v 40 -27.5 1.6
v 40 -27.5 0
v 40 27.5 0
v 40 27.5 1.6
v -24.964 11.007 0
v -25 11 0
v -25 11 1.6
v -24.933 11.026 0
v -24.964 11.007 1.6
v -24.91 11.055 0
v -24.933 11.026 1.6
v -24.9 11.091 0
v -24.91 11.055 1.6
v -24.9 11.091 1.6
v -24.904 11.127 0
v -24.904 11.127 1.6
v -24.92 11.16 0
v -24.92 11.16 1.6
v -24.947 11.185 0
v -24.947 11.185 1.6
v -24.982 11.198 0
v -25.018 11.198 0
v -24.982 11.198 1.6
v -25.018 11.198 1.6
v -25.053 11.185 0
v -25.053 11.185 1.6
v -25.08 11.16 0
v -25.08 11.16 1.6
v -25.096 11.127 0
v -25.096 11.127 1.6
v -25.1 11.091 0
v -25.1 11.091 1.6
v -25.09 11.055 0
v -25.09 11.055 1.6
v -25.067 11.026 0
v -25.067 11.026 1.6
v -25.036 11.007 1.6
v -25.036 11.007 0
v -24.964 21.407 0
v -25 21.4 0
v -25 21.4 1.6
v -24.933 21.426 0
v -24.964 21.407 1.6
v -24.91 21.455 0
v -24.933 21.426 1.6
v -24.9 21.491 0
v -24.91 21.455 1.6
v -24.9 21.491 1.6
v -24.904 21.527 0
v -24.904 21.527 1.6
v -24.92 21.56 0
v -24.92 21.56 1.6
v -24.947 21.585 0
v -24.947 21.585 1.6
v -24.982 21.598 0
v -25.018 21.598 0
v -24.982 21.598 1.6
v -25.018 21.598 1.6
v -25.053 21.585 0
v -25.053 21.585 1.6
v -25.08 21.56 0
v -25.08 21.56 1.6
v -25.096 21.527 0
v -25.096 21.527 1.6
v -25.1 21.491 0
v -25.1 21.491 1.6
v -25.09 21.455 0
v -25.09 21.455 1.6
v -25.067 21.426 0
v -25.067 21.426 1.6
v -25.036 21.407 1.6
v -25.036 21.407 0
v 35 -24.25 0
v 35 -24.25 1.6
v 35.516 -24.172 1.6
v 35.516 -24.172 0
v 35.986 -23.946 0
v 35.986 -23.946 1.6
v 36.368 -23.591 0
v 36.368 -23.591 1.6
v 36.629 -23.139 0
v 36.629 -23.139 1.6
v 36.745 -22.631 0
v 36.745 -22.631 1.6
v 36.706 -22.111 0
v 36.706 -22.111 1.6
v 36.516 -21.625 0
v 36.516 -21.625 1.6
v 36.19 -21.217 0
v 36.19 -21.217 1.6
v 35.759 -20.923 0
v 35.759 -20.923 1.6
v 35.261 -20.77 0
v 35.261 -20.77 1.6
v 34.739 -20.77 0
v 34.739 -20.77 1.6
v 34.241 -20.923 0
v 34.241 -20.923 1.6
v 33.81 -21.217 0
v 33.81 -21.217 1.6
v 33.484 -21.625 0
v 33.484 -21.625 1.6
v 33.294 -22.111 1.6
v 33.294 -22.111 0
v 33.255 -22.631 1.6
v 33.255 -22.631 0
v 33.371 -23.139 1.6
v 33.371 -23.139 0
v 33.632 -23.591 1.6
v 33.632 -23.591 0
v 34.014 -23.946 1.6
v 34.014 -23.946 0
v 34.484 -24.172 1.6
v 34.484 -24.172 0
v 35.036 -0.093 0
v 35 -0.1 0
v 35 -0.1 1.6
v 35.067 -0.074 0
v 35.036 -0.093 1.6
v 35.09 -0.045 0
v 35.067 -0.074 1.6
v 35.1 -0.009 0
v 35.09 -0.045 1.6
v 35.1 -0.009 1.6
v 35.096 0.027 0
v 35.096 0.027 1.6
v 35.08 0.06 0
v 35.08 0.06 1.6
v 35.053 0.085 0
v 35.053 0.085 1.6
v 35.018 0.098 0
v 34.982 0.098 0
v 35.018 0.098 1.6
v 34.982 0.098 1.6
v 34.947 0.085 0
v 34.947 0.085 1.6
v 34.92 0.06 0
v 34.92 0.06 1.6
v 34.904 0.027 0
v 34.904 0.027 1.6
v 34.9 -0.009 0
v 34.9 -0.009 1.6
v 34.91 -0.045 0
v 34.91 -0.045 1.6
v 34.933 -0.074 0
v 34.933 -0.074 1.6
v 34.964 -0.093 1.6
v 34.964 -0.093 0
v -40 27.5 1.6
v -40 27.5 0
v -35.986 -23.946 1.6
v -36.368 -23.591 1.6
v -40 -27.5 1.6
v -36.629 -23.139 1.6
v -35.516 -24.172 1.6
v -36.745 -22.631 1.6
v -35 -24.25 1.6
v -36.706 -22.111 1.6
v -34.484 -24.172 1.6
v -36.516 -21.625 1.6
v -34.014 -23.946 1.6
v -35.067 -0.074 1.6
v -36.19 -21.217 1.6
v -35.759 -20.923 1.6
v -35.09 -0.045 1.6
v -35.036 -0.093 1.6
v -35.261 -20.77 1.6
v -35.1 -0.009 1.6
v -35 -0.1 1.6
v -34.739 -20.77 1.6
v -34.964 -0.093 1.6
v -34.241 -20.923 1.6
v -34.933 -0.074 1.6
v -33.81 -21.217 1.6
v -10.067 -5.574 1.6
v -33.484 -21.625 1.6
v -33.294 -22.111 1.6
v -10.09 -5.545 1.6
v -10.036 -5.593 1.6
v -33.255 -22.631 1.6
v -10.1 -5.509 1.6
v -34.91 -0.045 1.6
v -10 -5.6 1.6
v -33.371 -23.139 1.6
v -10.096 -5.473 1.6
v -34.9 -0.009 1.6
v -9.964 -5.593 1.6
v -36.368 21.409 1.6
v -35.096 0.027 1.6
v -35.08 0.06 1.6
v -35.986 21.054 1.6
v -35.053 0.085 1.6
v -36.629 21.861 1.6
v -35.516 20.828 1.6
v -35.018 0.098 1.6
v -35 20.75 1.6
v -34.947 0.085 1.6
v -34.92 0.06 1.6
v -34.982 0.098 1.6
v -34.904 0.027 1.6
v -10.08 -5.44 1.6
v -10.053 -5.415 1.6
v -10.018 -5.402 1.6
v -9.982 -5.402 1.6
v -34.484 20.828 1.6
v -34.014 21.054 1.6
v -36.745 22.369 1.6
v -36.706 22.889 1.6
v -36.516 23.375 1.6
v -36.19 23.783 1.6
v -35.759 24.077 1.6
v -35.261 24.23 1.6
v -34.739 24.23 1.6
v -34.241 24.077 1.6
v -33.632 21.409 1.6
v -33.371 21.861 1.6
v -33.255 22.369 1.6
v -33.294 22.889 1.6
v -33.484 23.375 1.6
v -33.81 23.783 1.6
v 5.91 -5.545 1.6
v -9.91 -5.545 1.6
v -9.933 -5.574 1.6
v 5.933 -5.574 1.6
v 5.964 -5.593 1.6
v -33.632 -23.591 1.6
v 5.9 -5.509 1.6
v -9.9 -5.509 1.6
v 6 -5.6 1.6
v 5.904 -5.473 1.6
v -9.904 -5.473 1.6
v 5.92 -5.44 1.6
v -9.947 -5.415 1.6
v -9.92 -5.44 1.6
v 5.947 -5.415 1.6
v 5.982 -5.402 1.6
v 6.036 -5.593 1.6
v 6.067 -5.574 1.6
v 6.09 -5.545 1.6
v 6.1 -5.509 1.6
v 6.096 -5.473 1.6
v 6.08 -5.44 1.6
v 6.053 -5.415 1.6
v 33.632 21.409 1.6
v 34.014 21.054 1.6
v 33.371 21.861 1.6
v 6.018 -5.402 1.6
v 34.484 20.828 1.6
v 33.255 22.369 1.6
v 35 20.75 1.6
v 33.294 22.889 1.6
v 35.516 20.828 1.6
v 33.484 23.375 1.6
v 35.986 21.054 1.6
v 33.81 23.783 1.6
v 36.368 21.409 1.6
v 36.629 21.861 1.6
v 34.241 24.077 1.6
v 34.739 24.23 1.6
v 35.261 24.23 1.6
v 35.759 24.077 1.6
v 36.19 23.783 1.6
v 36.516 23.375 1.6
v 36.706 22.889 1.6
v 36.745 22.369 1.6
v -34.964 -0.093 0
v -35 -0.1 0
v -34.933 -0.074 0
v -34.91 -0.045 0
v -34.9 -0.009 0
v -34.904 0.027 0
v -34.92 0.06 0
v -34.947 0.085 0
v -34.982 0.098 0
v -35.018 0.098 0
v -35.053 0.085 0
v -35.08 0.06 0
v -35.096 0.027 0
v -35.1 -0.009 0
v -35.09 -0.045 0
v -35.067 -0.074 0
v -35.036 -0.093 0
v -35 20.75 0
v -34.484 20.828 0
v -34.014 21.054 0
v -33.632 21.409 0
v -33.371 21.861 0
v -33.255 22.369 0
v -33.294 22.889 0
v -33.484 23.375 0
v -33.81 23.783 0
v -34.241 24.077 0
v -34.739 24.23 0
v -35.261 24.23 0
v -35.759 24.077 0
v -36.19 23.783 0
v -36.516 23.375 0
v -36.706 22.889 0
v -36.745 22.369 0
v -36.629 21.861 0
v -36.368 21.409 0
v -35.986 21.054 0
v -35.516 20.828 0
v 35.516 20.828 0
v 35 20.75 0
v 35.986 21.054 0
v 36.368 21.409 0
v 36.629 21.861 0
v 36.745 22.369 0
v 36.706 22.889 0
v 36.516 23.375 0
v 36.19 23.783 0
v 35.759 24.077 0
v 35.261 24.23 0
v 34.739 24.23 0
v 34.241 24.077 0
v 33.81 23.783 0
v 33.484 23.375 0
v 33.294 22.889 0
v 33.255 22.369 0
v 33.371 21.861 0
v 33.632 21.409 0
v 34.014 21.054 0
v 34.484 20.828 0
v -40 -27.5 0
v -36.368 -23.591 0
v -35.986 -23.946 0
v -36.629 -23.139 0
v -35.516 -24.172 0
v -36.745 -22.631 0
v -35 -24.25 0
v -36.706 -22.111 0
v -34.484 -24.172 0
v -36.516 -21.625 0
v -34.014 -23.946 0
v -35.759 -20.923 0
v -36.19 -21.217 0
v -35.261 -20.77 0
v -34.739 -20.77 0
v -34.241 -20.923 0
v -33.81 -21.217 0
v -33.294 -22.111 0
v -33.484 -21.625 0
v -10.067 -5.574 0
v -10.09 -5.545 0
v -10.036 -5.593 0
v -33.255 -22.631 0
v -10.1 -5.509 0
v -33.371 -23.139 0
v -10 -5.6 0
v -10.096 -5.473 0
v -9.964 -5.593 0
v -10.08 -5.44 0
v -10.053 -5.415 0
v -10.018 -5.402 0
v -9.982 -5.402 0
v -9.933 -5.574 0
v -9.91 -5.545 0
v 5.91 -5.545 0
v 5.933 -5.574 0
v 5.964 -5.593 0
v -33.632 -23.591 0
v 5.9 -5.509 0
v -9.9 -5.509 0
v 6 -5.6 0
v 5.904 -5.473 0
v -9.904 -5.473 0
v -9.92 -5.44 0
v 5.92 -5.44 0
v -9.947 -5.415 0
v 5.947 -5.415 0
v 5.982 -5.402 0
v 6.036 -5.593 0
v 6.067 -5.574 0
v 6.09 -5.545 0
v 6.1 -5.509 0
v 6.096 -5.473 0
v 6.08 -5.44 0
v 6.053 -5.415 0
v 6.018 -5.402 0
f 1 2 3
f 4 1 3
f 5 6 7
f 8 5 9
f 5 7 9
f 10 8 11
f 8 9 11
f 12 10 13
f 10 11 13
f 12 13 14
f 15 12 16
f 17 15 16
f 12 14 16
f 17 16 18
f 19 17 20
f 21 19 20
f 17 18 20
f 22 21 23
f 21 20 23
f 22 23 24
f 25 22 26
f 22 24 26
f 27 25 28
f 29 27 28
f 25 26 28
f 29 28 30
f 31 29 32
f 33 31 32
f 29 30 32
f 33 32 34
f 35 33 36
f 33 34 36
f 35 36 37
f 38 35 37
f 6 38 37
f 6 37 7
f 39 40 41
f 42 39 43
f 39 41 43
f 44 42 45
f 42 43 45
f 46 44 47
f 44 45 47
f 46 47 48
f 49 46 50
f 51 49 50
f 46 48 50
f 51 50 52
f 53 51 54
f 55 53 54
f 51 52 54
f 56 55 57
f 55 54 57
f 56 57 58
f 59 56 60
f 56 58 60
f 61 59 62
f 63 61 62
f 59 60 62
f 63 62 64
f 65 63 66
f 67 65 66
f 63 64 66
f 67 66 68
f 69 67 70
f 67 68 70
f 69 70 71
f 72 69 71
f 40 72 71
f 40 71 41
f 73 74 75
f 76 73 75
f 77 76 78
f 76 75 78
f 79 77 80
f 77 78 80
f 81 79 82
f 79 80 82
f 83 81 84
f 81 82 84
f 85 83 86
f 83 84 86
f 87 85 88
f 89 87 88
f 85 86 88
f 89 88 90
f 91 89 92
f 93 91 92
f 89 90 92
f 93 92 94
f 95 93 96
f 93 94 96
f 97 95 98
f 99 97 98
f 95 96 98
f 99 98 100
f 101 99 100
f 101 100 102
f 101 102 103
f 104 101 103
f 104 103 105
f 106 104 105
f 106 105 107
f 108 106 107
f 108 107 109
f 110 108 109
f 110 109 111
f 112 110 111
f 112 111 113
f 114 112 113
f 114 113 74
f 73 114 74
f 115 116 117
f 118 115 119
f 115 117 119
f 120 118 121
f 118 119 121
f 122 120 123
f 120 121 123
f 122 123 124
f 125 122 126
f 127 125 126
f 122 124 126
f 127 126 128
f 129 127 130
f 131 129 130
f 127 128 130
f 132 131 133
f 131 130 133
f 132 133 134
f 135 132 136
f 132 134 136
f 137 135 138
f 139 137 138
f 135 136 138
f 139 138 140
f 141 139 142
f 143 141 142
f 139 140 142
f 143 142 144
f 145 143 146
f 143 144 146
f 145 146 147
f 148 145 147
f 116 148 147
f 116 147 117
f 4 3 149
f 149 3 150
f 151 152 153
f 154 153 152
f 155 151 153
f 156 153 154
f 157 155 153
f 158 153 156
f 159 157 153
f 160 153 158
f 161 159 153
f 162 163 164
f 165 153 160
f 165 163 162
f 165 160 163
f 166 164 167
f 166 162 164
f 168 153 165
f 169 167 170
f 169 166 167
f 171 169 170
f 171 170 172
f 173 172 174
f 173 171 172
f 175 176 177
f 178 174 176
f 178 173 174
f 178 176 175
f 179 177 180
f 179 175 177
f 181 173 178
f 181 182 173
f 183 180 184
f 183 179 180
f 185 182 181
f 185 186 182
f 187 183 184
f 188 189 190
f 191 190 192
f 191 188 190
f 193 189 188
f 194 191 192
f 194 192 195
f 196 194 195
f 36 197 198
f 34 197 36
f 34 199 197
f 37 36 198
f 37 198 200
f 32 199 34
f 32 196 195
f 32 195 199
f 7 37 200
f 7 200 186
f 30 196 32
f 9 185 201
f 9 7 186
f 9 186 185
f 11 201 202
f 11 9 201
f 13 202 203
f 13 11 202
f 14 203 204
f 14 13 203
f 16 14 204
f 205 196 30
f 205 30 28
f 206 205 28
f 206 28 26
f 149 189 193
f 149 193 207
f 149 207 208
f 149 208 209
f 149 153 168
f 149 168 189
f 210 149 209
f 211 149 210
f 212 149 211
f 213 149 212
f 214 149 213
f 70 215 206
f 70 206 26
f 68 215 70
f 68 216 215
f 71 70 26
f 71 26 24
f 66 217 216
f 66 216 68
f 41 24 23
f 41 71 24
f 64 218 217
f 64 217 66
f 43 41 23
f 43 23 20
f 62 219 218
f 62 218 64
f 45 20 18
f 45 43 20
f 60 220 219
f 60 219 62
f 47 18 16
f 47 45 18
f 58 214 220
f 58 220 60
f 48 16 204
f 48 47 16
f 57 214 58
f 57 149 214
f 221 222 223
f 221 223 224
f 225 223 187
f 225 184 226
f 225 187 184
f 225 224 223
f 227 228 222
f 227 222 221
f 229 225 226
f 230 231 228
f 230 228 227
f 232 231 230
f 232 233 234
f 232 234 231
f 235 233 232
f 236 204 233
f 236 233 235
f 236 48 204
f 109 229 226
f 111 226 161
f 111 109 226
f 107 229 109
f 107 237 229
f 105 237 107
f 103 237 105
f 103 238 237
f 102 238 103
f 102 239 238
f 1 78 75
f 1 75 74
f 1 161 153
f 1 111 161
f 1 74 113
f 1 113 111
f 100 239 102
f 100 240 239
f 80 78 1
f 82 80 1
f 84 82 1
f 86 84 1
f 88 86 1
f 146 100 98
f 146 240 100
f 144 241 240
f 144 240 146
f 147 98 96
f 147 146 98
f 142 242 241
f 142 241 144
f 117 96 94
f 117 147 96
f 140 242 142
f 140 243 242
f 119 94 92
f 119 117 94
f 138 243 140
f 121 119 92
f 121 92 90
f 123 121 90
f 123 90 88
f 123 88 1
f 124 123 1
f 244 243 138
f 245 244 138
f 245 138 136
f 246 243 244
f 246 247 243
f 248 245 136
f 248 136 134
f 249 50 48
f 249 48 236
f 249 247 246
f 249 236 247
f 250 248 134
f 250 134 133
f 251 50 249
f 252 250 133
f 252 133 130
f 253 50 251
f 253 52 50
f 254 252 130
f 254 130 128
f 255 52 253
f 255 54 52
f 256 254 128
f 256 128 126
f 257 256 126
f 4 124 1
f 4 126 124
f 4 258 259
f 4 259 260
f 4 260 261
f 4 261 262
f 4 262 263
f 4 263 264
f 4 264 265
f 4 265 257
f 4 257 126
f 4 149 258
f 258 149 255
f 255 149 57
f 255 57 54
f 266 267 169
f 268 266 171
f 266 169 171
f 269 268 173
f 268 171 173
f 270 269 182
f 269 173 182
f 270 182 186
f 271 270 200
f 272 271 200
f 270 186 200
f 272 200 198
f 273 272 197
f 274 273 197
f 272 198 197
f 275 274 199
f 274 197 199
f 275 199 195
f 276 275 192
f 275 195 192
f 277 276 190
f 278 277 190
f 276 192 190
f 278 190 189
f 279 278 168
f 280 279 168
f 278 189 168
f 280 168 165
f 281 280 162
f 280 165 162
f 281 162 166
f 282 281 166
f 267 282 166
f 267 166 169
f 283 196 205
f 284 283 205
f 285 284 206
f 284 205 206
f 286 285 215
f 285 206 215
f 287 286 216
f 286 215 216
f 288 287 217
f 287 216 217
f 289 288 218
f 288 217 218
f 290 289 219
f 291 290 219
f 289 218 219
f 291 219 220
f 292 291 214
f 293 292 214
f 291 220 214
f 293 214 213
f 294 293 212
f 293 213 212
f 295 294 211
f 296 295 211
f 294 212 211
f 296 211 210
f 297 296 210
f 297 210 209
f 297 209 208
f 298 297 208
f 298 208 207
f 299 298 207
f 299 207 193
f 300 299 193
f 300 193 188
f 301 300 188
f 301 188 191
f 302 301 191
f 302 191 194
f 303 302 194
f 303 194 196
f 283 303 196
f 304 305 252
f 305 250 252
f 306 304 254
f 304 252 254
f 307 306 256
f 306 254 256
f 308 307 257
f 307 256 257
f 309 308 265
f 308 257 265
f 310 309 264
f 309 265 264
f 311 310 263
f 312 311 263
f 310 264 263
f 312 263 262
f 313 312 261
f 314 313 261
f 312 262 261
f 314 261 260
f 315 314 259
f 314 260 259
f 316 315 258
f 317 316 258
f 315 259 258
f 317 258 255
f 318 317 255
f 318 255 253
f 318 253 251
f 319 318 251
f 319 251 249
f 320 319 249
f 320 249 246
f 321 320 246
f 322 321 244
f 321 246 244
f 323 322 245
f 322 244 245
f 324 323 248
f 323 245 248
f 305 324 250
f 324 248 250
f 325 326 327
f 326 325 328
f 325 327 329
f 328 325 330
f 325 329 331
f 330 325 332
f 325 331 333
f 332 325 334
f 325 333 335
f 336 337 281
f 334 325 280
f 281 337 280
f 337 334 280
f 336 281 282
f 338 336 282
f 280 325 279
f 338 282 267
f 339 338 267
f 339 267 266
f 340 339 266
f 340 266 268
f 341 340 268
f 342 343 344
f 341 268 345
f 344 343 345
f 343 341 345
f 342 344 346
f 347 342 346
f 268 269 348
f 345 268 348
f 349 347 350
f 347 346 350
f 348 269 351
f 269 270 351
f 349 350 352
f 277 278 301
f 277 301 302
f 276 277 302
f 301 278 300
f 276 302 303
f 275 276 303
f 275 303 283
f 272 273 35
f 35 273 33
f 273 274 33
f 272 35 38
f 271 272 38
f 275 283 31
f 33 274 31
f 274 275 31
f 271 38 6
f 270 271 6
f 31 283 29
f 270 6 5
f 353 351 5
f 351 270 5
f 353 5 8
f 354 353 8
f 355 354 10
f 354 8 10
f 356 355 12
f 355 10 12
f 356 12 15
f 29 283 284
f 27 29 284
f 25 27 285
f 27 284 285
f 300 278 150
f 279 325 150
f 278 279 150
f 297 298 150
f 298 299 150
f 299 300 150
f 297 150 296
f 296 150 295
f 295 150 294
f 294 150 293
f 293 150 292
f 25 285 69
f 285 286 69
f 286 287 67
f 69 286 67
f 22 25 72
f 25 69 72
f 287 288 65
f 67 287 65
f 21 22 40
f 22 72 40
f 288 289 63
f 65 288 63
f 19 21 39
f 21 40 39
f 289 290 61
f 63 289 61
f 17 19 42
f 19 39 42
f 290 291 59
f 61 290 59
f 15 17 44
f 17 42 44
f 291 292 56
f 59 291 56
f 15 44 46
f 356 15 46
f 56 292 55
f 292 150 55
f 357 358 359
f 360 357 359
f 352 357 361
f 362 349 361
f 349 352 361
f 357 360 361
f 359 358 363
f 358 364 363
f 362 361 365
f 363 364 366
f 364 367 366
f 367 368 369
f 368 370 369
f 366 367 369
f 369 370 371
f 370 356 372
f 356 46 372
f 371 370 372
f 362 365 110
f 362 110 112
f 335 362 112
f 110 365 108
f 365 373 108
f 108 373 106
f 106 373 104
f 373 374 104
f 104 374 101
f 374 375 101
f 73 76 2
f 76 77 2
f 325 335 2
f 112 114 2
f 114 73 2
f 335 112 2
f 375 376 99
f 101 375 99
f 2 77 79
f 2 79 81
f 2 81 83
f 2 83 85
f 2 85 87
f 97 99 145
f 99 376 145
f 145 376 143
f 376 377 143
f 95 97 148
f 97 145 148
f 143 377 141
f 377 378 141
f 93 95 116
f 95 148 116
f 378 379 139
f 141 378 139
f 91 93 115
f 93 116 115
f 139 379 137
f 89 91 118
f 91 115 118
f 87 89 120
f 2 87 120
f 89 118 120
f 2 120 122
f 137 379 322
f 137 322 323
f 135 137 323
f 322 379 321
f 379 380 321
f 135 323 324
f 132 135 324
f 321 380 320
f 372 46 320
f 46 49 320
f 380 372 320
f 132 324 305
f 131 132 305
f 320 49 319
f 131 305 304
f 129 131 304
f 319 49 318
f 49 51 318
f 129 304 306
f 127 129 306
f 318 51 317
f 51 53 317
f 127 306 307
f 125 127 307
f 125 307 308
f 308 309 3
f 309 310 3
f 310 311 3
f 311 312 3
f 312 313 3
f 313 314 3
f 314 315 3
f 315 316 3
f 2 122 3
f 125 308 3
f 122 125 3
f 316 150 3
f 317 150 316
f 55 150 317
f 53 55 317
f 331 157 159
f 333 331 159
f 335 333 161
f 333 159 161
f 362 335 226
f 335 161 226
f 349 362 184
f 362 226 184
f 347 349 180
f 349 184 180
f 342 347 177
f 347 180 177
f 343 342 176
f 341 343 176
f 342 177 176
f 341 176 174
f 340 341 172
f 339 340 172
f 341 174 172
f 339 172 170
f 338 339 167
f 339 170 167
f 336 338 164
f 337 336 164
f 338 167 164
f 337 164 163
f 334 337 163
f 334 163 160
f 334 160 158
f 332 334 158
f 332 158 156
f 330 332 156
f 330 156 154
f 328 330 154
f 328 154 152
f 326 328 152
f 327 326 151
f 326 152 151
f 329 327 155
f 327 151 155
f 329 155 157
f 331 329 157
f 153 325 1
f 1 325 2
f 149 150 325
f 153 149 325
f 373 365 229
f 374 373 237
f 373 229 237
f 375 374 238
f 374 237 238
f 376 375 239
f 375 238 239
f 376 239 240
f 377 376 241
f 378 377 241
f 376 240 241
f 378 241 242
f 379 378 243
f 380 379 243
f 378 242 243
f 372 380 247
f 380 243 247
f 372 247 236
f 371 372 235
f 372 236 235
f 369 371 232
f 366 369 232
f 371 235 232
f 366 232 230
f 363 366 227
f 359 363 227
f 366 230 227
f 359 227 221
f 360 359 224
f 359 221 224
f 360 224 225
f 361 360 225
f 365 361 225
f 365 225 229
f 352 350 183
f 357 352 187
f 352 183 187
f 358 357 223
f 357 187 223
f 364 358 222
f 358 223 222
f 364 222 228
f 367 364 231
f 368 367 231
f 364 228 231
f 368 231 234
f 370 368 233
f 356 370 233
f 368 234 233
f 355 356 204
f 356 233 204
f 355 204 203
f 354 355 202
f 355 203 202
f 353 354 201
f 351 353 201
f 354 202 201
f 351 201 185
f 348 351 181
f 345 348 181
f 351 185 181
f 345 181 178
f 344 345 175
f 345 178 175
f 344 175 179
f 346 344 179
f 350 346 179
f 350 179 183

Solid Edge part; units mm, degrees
sketch "Sketch1" plane through (0, 0, 0) normal (0, 0, 1) x (1, 0, 0)
  line L0 (-40, -27.5) -> (40, -27.5)
  line L1 (40, -27.5) -> (40, 27.5)
  line L2 (40, 27.5) -> (-40, 27.5)
  line L3 (-40, 27.5) -> (-40, -27.5)
  dimension "D1" = 55
  dimension "D2" = 80
extrude "Protrusion1" add sketch "Sketch1" along normal blind 1.6
hole "Hole1" at (-25, 11.1, 1.6) direction (0, 0, -1) diameter 0.2 end through all
hole "Hole2" at (-25, 21.5, 1.6) direction (0, 0, -1) diameter 0.2 end through all
hole "Hole3" at (6, -5.5, 1.6) direction (0, 0, -1) diameter 0.2 end through all
hole "Hole4" at (-10, -5.5, 1.6) direction (0, 0, -1) diameter 0.2 end through all
hole "Hole5" at (35, 22.5, 1.6) direction (0, 0, -1) diameter 3.5 end through all
hole "Hole6" at (35, -22.5, 1.6) direction (0, 0, -1) diameter 3.5 end through all
hole "Hole7" at (-35, -22.5, 1.6) direction (0, 0, -1) diameter 3.5 end through all
hole "Hole8" at (-35, 22.5, 1.6) direction (0, 0, -1) diameter 3.5 end through all
hole "Hole9" at (-35, 0, 1.6) direction (0, 0, 1) diameter 0.2 end through all both ways yes
hole "Hole10" at (35, 0, 1.6) direction (0, 0, 1) diameter 0.2 end through all both ways yes
